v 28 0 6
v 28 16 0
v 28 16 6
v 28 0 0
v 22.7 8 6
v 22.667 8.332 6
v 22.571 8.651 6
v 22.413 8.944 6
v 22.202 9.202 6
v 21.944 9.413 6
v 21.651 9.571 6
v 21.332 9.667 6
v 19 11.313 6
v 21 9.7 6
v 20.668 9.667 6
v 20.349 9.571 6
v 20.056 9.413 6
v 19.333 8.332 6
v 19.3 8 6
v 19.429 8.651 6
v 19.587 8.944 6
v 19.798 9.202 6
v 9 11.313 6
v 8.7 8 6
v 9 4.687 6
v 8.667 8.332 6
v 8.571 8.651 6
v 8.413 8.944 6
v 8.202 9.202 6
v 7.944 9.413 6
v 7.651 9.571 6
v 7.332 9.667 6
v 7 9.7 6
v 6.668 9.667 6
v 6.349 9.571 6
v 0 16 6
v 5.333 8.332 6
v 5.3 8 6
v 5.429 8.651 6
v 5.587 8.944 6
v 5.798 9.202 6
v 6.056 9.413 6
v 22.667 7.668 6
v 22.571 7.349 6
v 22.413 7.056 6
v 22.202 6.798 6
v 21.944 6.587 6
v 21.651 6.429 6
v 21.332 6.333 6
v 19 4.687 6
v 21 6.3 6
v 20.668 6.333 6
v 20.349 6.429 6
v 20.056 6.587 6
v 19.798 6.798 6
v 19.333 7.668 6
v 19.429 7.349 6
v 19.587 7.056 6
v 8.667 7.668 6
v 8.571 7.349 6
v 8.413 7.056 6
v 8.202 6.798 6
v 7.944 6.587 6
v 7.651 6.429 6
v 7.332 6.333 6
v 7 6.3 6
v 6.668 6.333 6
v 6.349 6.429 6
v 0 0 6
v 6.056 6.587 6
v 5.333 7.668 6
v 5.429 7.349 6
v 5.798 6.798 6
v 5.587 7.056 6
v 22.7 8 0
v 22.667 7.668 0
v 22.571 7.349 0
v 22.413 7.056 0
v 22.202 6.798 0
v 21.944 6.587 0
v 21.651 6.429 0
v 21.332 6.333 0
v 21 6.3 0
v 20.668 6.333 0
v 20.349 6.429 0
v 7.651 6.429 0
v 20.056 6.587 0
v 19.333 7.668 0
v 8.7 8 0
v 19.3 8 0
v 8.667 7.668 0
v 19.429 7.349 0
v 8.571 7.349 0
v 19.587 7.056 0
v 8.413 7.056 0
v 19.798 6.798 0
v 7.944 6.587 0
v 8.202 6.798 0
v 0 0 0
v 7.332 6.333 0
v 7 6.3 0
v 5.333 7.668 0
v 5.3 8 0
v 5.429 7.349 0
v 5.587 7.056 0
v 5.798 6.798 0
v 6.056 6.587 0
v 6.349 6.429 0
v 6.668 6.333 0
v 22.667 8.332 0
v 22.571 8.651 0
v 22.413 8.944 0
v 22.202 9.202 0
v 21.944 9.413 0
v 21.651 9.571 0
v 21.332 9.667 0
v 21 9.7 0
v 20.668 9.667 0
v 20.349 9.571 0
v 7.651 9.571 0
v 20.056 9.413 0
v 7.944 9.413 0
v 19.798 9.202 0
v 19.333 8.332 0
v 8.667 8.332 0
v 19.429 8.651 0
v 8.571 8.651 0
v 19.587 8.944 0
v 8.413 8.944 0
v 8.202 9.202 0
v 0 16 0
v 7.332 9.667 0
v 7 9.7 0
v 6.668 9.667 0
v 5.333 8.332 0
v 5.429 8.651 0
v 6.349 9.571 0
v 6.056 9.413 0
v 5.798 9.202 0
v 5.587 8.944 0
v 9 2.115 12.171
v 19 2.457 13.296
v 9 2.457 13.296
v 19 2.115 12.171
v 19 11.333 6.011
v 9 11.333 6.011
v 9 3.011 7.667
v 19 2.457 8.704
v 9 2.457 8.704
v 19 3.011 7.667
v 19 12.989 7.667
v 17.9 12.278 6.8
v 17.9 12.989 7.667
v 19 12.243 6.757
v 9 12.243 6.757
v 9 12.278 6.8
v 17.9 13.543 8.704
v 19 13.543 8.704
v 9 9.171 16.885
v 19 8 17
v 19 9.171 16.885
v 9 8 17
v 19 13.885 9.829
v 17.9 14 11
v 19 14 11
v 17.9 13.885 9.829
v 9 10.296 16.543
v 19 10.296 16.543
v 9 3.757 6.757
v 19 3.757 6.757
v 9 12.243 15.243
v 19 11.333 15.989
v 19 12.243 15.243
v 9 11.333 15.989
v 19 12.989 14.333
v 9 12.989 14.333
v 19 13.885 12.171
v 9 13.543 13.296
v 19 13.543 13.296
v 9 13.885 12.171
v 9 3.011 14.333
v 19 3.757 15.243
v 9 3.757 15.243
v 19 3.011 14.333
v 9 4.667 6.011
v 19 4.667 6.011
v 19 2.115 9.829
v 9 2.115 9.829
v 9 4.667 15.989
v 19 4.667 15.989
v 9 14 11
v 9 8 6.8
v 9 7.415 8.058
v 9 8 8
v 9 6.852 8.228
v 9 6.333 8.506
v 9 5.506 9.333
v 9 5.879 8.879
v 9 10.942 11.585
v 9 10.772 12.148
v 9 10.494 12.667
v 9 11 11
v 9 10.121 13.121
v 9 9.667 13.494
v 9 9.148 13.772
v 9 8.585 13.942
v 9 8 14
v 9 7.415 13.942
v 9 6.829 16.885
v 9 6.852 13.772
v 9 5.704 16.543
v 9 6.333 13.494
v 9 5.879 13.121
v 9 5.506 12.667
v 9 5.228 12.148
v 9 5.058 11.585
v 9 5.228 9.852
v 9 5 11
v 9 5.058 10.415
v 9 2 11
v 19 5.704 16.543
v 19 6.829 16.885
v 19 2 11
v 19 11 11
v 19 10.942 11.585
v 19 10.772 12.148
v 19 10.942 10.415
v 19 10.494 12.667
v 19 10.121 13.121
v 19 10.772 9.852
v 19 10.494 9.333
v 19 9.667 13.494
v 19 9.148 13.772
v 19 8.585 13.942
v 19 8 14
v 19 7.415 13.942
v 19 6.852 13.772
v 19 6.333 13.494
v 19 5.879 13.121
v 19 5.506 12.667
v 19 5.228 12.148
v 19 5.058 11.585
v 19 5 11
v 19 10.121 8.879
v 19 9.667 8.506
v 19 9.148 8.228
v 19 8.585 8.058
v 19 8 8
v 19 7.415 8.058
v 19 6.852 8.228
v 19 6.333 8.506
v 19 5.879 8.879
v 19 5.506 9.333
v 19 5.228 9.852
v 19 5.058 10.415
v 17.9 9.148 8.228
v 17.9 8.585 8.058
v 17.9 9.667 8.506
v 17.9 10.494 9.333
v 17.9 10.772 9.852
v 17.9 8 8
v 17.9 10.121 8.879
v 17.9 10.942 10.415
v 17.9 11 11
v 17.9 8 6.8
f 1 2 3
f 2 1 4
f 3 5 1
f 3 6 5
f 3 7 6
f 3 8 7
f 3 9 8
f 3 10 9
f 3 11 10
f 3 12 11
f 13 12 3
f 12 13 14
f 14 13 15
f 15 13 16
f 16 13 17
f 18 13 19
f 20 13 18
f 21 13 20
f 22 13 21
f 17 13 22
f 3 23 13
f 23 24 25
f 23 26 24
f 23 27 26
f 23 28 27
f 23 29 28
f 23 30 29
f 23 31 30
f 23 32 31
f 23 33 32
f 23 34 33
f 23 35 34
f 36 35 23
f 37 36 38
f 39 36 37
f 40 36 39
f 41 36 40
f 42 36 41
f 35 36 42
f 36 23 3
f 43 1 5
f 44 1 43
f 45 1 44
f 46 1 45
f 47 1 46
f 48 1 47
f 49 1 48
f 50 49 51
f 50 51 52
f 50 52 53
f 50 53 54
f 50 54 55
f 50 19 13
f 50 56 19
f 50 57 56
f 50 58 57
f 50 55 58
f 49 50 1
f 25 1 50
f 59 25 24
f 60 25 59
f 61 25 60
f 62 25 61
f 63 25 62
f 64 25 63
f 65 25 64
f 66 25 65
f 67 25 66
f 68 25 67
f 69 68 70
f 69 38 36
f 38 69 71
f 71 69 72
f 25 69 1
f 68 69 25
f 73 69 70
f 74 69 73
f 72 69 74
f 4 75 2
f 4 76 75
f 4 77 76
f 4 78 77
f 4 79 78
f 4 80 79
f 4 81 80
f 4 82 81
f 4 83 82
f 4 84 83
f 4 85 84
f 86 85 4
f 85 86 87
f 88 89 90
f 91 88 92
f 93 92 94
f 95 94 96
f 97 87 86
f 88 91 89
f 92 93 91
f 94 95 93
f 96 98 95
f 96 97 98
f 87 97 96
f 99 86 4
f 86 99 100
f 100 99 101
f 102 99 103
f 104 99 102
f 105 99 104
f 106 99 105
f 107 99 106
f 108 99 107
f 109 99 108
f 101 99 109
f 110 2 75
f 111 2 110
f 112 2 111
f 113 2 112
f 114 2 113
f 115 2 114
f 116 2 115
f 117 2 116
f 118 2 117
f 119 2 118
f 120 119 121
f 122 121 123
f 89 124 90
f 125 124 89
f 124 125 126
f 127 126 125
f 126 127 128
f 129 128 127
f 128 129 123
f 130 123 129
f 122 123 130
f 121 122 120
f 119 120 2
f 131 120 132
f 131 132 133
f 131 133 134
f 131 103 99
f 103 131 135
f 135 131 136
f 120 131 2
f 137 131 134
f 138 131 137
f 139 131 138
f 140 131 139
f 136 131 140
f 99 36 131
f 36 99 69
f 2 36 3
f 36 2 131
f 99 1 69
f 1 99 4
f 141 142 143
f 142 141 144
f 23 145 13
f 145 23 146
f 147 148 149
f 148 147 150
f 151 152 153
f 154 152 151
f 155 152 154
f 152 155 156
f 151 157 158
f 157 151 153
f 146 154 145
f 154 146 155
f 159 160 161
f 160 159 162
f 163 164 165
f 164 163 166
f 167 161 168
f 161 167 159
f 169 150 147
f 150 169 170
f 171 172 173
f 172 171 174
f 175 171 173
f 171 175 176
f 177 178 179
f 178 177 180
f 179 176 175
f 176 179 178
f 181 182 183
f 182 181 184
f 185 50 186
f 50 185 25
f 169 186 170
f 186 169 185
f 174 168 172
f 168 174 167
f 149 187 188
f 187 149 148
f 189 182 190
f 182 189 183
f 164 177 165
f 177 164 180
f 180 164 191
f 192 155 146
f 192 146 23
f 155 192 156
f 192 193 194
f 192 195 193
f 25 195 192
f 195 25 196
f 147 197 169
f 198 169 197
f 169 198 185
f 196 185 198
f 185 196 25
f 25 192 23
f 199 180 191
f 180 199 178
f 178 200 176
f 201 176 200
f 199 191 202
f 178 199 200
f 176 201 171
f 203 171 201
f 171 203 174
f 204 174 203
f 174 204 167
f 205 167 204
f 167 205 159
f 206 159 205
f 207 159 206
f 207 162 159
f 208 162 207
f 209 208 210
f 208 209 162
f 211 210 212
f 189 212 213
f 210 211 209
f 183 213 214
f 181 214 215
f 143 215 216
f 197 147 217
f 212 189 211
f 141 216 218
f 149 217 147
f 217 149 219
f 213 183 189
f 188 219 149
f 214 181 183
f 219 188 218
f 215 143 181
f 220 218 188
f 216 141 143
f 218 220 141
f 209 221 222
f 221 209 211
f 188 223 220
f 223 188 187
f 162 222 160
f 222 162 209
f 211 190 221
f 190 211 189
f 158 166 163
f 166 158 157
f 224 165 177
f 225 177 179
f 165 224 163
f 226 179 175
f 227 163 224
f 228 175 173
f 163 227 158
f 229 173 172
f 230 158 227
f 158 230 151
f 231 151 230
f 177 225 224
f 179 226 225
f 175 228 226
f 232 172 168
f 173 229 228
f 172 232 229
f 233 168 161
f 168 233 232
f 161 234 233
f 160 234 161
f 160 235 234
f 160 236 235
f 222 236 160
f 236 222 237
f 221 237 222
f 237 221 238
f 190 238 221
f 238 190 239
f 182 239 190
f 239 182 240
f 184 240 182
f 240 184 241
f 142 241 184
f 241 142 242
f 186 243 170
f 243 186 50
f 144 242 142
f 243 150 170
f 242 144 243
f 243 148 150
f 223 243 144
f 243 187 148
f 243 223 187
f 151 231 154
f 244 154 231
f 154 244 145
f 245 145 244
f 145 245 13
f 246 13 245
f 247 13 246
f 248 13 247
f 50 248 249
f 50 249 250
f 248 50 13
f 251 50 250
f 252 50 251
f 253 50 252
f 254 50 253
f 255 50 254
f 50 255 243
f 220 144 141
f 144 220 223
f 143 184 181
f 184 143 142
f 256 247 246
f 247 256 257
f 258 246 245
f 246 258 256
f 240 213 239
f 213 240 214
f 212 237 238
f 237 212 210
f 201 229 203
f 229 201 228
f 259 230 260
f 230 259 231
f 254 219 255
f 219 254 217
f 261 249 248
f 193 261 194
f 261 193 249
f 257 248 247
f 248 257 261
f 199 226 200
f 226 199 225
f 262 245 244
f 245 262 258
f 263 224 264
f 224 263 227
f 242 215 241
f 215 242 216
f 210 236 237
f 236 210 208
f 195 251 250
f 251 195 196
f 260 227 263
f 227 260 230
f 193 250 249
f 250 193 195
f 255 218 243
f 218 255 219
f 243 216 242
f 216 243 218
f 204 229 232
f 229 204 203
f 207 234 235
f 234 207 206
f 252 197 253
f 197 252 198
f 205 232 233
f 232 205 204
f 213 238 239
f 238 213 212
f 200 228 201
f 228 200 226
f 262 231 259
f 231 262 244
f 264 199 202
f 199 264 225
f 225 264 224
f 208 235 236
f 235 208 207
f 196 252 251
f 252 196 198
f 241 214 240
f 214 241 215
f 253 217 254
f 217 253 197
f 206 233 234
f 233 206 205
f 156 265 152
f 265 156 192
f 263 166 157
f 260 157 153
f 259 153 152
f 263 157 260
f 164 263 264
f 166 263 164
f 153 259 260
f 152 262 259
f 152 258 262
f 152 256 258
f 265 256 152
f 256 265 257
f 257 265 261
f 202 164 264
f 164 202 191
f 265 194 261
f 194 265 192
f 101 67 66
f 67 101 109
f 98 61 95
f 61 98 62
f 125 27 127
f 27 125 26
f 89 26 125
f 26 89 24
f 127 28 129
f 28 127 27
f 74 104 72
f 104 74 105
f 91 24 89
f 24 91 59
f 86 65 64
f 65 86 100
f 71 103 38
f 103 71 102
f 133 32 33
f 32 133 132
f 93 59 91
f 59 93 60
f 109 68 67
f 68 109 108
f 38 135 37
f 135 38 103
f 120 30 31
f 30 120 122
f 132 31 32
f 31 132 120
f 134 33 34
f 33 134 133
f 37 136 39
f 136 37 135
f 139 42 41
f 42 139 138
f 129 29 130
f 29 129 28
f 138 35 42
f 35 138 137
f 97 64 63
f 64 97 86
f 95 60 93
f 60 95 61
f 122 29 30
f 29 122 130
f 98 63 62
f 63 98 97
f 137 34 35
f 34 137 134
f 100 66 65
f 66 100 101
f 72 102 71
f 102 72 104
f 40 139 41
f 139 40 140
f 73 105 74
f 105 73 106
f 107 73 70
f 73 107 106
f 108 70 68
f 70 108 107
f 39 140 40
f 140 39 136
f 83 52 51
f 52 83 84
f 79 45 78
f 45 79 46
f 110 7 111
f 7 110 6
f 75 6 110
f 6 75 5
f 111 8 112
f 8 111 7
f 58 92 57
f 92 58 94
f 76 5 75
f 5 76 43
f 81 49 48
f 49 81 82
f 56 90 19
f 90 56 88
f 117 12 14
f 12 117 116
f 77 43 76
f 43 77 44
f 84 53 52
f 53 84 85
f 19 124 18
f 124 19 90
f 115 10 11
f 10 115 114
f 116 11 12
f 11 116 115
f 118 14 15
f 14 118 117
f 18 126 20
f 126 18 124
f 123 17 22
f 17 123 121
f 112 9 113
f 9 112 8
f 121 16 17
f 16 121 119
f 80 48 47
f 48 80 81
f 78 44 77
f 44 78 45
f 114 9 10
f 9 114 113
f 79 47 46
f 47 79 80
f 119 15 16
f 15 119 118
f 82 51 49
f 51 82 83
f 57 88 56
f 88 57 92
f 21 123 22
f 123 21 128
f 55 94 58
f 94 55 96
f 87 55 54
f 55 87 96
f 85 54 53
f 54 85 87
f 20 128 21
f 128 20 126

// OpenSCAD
$fn = 32;

// ----------------------------------------------------------------------
// Cable clip: cable 6 mm, clamp 12 mm, base 28 mm
// ----------------------------------------------------------------------

// --- parameters (mm) ---
plate_x = 28;             // base length, X
plate_y = 16;             // base width, Y
plate_t = 6;              // base thickness
wire_seat_d = 12;         // clamp outside diameter
clip_t = 3;               // clamp wall
cable_d = 6;              // cable opening
ring_w = 10;              // clamp width along the cable
screw_d = 3.4;            // screw clearance
throat = 4.2;             // snap throat width
sink = 1;                 // overlap of the clamp into the base

module base() {
  cube([plate_x, plate_y, plate_t]);
}

module clamp() {
  translate([plate_x / 2, plate_y / 2, plate_t + wire_seat_d / 2 - sink]) rotate([0, 90, 0])
    cylinder(h = ring_w, d = wire_seat_d, center = true);
}

difference() {
  union() {
    base();
    clamp();
  }
  translate([plate_x / 2, plate_y / 2, plate_t + wire_seat_d / 2 - sink]) rotate([0, 90, 0]) translate([0, 0, -ring_w / 2 - 1]) cylinder(h = ring_w + 2, d = cable_d);
  /* snap throat: the opening is narrower than the cable */
  translate([plate_x / 2 - throat / 2, plate_y / 2, plate_t + wire_seat_d / 2 - sink]) rotate([0, 90, 0]) translate([0, 0, -ring_w / 2 - 1]) cube([throat, wire_seat_d + 2, ring_w + 2]);
  translate([7, plate_y / 2, -1]) cylinder(h = plate_t + 2, d = screw_d);
  translate([21, plate_y / 2, -1]) cylinder(h = plate_t + 2, d = screw_d);
}
